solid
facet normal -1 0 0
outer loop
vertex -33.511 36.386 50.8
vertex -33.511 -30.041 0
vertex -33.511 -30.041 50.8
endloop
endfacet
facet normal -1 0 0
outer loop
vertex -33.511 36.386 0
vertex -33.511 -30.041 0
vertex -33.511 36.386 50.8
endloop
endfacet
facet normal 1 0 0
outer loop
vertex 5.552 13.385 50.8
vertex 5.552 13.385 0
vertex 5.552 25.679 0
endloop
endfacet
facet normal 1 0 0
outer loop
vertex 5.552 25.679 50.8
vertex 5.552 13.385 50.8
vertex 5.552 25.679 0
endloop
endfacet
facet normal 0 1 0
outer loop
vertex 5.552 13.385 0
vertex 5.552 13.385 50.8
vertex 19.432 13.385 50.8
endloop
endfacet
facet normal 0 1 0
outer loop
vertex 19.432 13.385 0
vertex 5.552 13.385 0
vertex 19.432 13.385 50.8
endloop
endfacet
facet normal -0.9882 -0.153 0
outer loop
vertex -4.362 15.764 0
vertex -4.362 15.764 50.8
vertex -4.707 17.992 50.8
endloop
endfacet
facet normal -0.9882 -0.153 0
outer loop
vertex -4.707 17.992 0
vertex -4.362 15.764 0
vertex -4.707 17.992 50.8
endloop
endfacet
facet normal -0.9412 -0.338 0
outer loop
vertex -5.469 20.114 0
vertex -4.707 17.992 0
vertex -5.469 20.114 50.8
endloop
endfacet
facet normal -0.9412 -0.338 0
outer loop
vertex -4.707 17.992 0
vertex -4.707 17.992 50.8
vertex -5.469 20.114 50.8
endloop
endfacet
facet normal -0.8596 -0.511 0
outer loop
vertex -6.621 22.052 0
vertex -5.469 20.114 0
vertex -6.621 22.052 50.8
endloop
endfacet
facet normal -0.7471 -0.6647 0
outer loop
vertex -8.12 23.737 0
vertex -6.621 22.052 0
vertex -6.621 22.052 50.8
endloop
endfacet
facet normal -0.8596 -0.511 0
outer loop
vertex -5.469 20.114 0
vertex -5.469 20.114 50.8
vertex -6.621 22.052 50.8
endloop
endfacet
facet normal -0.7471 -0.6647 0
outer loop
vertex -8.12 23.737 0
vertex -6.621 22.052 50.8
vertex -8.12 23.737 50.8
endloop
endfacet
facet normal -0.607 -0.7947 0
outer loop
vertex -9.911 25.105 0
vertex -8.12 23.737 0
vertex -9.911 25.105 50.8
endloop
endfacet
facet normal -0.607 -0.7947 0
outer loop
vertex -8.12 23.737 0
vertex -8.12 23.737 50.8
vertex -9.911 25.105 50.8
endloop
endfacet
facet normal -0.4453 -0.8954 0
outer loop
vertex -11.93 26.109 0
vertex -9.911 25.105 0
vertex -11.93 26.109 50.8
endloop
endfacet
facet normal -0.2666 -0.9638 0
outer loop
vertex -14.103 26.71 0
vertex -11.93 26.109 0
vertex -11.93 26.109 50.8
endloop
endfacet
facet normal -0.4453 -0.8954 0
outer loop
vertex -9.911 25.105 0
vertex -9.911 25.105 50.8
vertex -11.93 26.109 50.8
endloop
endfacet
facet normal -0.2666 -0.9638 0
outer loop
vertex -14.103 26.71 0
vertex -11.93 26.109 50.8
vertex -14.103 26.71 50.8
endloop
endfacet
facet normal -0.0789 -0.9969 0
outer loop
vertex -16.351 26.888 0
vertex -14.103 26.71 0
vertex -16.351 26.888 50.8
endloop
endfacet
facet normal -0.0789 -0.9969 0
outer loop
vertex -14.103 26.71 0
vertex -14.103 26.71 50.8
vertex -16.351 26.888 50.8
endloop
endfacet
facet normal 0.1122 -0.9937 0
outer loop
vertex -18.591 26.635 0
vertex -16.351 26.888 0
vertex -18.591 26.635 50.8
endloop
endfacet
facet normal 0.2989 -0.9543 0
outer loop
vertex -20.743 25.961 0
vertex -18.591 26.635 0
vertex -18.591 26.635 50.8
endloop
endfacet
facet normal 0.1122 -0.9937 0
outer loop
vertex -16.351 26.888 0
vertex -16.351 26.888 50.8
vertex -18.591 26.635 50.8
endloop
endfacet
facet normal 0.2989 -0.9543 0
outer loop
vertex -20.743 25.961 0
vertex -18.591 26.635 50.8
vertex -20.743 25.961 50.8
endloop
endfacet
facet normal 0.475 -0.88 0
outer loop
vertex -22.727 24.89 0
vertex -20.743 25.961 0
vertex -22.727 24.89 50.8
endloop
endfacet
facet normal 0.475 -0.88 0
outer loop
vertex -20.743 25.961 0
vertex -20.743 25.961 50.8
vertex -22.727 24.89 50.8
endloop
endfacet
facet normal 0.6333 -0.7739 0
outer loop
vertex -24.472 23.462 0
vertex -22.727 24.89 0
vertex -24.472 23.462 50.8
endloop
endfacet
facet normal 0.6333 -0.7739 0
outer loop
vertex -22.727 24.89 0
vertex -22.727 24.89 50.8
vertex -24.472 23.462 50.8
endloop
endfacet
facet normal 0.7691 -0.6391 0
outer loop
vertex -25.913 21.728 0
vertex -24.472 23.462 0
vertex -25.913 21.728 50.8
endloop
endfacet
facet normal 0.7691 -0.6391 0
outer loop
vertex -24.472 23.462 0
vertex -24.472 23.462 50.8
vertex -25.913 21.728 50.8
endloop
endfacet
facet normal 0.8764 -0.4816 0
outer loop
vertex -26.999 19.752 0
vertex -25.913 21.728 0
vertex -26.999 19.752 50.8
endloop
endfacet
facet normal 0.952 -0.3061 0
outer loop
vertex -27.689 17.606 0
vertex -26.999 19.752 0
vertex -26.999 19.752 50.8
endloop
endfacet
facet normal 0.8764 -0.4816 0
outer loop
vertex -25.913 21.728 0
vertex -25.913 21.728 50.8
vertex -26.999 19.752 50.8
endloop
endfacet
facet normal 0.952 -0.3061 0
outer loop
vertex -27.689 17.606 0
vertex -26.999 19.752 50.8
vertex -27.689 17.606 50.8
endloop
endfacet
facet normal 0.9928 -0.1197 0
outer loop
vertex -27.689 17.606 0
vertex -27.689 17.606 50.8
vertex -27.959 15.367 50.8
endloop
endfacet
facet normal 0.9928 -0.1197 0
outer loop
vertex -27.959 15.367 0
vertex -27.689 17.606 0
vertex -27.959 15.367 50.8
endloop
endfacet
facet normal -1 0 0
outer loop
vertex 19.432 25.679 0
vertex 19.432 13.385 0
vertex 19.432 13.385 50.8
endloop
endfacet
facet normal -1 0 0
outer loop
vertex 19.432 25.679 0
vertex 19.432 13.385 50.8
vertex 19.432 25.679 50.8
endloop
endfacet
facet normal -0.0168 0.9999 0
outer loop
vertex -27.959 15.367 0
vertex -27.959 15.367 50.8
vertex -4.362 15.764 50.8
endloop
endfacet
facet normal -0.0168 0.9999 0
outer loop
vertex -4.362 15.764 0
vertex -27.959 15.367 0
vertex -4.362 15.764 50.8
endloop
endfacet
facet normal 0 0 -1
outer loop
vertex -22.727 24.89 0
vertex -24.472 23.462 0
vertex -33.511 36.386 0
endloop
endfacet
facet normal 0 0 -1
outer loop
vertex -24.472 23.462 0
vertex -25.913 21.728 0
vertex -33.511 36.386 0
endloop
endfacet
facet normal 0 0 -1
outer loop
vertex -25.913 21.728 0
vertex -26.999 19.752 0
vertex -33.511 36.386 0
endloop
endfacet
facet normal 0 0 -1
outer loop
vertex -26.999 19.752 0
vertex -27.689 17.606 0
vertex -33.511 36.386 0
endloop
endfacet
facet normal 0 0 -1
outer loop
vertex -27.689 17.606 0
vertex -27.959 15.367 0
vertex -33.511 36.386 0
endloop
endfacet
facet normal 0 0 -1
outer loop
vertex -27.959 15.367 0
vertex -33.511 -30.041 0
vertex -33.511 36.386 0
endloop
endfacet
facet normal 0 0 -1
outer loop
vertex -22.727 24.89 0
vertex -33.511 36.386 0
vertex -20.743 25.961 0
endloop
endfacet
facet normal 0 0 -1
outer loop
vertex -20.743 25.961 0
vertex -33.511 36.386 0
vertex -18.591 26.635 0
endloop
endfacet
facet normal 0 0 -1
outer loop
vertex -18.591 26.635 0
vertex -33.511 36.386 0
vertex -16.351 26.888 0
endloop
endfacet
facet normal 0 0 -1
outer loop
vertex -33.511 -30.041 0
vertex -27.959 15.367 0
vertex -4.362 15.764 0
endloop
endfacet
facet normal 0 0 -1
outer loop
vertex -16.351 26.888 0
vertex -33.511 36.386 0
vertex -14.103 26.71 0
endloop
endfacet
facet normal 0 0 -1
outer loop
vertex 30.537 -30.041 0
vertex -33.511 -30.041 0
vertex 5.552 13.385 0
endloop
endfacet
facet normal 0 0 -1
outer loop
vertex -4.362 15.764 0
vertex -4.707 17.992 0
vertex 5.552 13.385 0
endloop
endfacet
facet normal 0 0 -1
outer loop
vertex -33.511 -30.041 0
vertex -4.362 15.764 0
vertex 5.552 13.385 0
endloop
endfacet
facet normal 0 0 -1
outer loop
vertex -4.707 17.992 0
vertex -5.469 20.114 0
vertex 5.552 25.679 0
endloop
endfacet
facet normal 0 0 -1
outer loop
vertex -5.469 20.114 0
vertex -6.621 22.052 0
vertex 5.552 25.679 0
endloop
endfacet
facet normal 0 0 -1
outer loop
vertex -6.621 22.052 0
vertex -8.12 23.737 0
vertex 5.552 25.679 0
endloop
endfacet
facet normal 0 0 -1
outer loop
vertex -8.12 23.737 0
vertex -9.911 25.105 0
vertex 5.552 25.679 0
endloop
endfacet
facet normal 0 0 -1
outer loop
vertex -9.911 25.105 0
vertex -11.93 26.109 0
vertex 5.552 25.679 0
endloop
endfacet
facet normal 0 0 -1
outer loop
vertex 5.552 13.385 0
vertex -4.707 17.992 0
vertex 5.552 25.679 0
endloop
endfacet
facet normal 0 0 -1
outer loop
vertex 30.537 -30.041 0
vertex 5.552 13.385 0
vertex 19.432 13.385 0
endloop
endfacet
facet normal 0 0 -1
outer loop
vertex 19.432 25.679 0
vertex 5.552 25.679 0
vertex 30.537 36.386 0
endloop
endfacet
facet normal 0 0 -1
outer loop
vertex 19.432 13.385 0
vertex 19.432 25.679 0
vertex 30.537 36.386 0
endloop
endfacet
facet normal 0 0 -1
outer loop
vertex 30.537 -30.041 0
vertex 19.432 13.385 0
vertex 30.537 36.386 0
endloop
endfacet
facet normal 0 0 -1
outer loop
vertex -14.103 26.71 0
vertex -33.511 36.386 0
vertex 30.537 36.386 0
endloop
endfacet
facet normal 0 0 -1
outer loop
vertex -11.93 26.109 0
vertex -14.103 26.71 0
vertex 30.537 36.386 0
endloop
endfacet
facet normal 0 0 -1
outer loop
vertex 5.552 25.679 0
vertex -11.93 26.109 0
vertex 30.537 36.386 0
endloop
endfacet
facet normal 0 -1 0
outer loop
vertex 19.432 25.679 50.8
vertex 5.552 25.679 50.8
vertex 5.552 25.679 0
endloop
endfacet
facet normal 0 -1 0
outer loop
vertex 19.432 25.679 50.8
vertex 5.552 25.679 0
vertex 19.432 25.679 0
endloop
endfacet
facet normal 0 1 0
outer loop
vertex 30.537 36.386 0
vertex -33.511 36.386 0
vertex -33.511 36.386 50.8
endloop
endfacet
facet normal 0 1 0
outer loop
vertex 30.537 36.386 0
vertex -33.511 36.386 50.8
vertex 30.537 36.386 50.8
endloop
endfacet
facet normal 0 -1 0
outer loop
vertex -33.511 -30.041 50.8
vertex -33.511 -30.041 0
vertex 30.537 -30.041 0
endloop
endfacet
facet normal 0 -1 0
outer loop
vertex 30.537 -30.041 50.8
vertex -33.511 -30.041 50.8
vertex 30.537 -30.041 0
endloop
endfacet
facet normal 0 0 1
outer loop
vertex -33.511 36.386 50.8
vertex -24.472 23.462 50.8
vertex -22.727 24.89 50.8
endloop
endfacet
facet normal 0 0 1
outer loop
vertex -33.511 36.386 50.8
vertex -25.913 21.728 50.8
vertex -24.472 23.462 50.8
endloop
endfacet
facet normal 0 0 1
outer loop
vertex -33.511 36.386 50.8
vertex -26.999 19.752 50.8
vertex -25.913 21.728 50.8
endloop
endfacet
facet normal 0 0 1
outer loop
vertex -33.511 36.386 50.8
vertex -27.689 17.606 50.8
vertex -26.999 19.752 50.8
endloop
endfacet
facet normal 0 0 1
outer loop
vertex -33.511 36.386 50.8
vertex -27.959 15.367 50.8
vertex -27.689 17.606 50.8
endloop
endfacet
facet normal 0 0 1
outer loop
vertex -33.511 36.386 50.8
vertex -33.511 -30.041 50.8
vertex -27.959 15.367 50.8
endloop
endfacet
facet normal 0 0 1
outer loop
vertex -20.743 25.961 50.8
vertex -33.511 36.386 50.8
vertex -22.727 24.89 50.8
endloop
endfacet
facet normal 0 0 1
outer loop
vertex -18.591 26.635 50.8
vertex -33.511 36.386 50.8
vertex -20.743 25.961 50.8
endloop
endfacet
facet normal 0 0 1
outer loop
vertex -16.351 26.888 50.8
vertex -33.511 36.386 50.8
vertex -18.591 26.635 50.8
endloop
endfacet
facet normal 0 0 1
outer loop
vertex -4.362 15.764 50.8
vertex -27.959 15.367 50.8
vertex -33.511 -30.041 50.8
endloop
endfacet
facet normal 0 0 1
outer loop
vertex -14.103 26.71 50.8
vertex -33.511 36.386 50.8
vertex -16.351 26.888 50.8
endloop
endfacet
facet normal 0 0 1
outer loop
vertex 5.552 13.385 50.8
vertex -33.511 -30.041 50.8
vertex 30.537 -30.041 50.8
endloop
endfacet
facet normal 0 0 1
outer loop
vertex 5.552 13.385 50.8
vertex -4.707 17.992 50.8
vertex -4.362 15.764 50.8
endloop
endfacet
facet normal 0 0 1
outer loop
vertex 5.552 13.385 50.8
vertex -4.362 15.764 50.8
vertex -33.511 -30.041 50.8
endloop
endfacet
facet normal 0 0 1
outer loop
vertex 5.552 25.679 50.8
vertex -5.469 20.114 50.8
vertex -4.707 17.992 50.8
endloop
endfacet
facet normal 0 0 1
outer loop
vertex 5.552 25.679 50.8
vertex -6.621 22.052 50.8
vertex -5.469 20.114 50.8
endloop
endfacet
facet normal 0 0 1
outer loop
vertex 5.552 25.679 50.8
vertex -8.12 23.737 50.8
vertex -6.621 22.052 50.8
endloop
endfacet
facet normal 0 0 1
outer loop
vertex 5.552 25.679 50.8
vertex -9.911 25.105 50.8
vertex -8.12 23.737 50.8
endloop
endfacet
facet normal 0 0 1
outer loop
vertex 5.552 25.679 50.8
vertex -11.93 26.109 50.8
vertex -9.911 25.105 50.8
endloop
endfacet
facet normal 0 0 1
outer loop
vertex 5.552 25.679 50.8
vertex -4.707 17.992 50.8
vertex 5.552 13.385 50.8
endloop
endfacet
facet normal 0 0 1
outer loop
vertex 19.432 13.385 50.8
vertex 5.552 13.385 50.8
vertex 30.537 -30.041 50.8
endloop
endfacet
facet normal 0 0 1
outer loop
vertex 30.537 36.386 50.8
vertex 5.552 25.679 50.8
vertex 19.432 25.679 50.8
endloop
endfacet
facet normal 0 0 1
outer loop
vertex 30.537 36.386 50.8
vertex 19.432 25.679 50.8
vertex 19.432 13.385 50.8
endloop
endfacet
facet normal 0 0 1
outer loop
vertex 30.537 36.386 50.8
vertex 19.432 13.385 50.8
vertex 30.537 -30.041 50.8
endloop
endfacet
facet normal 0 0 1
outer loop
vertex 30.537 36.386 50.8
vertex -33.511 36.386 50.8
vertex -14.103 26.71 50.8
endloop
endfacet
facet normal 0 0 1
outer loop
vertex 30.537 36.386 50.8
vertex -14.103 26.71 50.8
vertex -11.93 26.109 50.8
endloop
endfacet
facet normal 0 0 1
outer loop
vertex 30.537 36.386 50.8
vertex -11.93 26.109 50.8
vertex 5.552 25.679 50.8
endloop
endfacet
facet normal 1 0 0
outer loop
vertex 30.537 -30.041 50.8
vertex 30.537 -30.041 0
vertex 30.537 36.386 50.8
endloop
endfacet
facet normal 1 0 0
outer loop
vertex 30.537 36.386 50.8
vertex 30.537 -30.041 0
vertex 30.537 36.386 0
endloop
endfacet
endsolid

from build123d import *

# Parameters (mm, degrees)
F0_W     = 64.047658
F0_H     = 66.427136
F1_DEPTH = 50.8
F2_W     = 13.880294
F2_H     = 12.293976
F3_DEPTH = 50.8
F5_DEPTH = 50.8


with BuildPart() as f1:
    # F0 (on Top) → F1 (new body)
    with BuildSketch(Plane.XY):
        with Locations((-1.487176, 3.172639)):
            Rectangle(F0_W, F0_H)
    extrude(amount=F1_DEPTH)

    # F2 (on face) → F3 (cut)
    with BuildSketch(Plane.XY.offset(50.8)):
        with Locations((12.492267, 19.531561)):
            Rectangle(F2_W, F2_H)
    extrude(amount=-F3_DEPTH, mode=Mode.SUBTRACT)

    # F4 (on face) → F5 (cut)
    with BuildSketch(Plane.XY.offset(50.8)):
        with BuildLine():
            Line((-27.958885, 15.367473), (-4.362379, 15.764052))
            ThreePointArc((-4.362379, 15.764052), (-16.350913, 26.887516), (-27.958885, 15.367473))
        make_face()
    extrude(amount=-F5_DEPTH, mode=Mode.SUBTRACT)


solid = f1.part
